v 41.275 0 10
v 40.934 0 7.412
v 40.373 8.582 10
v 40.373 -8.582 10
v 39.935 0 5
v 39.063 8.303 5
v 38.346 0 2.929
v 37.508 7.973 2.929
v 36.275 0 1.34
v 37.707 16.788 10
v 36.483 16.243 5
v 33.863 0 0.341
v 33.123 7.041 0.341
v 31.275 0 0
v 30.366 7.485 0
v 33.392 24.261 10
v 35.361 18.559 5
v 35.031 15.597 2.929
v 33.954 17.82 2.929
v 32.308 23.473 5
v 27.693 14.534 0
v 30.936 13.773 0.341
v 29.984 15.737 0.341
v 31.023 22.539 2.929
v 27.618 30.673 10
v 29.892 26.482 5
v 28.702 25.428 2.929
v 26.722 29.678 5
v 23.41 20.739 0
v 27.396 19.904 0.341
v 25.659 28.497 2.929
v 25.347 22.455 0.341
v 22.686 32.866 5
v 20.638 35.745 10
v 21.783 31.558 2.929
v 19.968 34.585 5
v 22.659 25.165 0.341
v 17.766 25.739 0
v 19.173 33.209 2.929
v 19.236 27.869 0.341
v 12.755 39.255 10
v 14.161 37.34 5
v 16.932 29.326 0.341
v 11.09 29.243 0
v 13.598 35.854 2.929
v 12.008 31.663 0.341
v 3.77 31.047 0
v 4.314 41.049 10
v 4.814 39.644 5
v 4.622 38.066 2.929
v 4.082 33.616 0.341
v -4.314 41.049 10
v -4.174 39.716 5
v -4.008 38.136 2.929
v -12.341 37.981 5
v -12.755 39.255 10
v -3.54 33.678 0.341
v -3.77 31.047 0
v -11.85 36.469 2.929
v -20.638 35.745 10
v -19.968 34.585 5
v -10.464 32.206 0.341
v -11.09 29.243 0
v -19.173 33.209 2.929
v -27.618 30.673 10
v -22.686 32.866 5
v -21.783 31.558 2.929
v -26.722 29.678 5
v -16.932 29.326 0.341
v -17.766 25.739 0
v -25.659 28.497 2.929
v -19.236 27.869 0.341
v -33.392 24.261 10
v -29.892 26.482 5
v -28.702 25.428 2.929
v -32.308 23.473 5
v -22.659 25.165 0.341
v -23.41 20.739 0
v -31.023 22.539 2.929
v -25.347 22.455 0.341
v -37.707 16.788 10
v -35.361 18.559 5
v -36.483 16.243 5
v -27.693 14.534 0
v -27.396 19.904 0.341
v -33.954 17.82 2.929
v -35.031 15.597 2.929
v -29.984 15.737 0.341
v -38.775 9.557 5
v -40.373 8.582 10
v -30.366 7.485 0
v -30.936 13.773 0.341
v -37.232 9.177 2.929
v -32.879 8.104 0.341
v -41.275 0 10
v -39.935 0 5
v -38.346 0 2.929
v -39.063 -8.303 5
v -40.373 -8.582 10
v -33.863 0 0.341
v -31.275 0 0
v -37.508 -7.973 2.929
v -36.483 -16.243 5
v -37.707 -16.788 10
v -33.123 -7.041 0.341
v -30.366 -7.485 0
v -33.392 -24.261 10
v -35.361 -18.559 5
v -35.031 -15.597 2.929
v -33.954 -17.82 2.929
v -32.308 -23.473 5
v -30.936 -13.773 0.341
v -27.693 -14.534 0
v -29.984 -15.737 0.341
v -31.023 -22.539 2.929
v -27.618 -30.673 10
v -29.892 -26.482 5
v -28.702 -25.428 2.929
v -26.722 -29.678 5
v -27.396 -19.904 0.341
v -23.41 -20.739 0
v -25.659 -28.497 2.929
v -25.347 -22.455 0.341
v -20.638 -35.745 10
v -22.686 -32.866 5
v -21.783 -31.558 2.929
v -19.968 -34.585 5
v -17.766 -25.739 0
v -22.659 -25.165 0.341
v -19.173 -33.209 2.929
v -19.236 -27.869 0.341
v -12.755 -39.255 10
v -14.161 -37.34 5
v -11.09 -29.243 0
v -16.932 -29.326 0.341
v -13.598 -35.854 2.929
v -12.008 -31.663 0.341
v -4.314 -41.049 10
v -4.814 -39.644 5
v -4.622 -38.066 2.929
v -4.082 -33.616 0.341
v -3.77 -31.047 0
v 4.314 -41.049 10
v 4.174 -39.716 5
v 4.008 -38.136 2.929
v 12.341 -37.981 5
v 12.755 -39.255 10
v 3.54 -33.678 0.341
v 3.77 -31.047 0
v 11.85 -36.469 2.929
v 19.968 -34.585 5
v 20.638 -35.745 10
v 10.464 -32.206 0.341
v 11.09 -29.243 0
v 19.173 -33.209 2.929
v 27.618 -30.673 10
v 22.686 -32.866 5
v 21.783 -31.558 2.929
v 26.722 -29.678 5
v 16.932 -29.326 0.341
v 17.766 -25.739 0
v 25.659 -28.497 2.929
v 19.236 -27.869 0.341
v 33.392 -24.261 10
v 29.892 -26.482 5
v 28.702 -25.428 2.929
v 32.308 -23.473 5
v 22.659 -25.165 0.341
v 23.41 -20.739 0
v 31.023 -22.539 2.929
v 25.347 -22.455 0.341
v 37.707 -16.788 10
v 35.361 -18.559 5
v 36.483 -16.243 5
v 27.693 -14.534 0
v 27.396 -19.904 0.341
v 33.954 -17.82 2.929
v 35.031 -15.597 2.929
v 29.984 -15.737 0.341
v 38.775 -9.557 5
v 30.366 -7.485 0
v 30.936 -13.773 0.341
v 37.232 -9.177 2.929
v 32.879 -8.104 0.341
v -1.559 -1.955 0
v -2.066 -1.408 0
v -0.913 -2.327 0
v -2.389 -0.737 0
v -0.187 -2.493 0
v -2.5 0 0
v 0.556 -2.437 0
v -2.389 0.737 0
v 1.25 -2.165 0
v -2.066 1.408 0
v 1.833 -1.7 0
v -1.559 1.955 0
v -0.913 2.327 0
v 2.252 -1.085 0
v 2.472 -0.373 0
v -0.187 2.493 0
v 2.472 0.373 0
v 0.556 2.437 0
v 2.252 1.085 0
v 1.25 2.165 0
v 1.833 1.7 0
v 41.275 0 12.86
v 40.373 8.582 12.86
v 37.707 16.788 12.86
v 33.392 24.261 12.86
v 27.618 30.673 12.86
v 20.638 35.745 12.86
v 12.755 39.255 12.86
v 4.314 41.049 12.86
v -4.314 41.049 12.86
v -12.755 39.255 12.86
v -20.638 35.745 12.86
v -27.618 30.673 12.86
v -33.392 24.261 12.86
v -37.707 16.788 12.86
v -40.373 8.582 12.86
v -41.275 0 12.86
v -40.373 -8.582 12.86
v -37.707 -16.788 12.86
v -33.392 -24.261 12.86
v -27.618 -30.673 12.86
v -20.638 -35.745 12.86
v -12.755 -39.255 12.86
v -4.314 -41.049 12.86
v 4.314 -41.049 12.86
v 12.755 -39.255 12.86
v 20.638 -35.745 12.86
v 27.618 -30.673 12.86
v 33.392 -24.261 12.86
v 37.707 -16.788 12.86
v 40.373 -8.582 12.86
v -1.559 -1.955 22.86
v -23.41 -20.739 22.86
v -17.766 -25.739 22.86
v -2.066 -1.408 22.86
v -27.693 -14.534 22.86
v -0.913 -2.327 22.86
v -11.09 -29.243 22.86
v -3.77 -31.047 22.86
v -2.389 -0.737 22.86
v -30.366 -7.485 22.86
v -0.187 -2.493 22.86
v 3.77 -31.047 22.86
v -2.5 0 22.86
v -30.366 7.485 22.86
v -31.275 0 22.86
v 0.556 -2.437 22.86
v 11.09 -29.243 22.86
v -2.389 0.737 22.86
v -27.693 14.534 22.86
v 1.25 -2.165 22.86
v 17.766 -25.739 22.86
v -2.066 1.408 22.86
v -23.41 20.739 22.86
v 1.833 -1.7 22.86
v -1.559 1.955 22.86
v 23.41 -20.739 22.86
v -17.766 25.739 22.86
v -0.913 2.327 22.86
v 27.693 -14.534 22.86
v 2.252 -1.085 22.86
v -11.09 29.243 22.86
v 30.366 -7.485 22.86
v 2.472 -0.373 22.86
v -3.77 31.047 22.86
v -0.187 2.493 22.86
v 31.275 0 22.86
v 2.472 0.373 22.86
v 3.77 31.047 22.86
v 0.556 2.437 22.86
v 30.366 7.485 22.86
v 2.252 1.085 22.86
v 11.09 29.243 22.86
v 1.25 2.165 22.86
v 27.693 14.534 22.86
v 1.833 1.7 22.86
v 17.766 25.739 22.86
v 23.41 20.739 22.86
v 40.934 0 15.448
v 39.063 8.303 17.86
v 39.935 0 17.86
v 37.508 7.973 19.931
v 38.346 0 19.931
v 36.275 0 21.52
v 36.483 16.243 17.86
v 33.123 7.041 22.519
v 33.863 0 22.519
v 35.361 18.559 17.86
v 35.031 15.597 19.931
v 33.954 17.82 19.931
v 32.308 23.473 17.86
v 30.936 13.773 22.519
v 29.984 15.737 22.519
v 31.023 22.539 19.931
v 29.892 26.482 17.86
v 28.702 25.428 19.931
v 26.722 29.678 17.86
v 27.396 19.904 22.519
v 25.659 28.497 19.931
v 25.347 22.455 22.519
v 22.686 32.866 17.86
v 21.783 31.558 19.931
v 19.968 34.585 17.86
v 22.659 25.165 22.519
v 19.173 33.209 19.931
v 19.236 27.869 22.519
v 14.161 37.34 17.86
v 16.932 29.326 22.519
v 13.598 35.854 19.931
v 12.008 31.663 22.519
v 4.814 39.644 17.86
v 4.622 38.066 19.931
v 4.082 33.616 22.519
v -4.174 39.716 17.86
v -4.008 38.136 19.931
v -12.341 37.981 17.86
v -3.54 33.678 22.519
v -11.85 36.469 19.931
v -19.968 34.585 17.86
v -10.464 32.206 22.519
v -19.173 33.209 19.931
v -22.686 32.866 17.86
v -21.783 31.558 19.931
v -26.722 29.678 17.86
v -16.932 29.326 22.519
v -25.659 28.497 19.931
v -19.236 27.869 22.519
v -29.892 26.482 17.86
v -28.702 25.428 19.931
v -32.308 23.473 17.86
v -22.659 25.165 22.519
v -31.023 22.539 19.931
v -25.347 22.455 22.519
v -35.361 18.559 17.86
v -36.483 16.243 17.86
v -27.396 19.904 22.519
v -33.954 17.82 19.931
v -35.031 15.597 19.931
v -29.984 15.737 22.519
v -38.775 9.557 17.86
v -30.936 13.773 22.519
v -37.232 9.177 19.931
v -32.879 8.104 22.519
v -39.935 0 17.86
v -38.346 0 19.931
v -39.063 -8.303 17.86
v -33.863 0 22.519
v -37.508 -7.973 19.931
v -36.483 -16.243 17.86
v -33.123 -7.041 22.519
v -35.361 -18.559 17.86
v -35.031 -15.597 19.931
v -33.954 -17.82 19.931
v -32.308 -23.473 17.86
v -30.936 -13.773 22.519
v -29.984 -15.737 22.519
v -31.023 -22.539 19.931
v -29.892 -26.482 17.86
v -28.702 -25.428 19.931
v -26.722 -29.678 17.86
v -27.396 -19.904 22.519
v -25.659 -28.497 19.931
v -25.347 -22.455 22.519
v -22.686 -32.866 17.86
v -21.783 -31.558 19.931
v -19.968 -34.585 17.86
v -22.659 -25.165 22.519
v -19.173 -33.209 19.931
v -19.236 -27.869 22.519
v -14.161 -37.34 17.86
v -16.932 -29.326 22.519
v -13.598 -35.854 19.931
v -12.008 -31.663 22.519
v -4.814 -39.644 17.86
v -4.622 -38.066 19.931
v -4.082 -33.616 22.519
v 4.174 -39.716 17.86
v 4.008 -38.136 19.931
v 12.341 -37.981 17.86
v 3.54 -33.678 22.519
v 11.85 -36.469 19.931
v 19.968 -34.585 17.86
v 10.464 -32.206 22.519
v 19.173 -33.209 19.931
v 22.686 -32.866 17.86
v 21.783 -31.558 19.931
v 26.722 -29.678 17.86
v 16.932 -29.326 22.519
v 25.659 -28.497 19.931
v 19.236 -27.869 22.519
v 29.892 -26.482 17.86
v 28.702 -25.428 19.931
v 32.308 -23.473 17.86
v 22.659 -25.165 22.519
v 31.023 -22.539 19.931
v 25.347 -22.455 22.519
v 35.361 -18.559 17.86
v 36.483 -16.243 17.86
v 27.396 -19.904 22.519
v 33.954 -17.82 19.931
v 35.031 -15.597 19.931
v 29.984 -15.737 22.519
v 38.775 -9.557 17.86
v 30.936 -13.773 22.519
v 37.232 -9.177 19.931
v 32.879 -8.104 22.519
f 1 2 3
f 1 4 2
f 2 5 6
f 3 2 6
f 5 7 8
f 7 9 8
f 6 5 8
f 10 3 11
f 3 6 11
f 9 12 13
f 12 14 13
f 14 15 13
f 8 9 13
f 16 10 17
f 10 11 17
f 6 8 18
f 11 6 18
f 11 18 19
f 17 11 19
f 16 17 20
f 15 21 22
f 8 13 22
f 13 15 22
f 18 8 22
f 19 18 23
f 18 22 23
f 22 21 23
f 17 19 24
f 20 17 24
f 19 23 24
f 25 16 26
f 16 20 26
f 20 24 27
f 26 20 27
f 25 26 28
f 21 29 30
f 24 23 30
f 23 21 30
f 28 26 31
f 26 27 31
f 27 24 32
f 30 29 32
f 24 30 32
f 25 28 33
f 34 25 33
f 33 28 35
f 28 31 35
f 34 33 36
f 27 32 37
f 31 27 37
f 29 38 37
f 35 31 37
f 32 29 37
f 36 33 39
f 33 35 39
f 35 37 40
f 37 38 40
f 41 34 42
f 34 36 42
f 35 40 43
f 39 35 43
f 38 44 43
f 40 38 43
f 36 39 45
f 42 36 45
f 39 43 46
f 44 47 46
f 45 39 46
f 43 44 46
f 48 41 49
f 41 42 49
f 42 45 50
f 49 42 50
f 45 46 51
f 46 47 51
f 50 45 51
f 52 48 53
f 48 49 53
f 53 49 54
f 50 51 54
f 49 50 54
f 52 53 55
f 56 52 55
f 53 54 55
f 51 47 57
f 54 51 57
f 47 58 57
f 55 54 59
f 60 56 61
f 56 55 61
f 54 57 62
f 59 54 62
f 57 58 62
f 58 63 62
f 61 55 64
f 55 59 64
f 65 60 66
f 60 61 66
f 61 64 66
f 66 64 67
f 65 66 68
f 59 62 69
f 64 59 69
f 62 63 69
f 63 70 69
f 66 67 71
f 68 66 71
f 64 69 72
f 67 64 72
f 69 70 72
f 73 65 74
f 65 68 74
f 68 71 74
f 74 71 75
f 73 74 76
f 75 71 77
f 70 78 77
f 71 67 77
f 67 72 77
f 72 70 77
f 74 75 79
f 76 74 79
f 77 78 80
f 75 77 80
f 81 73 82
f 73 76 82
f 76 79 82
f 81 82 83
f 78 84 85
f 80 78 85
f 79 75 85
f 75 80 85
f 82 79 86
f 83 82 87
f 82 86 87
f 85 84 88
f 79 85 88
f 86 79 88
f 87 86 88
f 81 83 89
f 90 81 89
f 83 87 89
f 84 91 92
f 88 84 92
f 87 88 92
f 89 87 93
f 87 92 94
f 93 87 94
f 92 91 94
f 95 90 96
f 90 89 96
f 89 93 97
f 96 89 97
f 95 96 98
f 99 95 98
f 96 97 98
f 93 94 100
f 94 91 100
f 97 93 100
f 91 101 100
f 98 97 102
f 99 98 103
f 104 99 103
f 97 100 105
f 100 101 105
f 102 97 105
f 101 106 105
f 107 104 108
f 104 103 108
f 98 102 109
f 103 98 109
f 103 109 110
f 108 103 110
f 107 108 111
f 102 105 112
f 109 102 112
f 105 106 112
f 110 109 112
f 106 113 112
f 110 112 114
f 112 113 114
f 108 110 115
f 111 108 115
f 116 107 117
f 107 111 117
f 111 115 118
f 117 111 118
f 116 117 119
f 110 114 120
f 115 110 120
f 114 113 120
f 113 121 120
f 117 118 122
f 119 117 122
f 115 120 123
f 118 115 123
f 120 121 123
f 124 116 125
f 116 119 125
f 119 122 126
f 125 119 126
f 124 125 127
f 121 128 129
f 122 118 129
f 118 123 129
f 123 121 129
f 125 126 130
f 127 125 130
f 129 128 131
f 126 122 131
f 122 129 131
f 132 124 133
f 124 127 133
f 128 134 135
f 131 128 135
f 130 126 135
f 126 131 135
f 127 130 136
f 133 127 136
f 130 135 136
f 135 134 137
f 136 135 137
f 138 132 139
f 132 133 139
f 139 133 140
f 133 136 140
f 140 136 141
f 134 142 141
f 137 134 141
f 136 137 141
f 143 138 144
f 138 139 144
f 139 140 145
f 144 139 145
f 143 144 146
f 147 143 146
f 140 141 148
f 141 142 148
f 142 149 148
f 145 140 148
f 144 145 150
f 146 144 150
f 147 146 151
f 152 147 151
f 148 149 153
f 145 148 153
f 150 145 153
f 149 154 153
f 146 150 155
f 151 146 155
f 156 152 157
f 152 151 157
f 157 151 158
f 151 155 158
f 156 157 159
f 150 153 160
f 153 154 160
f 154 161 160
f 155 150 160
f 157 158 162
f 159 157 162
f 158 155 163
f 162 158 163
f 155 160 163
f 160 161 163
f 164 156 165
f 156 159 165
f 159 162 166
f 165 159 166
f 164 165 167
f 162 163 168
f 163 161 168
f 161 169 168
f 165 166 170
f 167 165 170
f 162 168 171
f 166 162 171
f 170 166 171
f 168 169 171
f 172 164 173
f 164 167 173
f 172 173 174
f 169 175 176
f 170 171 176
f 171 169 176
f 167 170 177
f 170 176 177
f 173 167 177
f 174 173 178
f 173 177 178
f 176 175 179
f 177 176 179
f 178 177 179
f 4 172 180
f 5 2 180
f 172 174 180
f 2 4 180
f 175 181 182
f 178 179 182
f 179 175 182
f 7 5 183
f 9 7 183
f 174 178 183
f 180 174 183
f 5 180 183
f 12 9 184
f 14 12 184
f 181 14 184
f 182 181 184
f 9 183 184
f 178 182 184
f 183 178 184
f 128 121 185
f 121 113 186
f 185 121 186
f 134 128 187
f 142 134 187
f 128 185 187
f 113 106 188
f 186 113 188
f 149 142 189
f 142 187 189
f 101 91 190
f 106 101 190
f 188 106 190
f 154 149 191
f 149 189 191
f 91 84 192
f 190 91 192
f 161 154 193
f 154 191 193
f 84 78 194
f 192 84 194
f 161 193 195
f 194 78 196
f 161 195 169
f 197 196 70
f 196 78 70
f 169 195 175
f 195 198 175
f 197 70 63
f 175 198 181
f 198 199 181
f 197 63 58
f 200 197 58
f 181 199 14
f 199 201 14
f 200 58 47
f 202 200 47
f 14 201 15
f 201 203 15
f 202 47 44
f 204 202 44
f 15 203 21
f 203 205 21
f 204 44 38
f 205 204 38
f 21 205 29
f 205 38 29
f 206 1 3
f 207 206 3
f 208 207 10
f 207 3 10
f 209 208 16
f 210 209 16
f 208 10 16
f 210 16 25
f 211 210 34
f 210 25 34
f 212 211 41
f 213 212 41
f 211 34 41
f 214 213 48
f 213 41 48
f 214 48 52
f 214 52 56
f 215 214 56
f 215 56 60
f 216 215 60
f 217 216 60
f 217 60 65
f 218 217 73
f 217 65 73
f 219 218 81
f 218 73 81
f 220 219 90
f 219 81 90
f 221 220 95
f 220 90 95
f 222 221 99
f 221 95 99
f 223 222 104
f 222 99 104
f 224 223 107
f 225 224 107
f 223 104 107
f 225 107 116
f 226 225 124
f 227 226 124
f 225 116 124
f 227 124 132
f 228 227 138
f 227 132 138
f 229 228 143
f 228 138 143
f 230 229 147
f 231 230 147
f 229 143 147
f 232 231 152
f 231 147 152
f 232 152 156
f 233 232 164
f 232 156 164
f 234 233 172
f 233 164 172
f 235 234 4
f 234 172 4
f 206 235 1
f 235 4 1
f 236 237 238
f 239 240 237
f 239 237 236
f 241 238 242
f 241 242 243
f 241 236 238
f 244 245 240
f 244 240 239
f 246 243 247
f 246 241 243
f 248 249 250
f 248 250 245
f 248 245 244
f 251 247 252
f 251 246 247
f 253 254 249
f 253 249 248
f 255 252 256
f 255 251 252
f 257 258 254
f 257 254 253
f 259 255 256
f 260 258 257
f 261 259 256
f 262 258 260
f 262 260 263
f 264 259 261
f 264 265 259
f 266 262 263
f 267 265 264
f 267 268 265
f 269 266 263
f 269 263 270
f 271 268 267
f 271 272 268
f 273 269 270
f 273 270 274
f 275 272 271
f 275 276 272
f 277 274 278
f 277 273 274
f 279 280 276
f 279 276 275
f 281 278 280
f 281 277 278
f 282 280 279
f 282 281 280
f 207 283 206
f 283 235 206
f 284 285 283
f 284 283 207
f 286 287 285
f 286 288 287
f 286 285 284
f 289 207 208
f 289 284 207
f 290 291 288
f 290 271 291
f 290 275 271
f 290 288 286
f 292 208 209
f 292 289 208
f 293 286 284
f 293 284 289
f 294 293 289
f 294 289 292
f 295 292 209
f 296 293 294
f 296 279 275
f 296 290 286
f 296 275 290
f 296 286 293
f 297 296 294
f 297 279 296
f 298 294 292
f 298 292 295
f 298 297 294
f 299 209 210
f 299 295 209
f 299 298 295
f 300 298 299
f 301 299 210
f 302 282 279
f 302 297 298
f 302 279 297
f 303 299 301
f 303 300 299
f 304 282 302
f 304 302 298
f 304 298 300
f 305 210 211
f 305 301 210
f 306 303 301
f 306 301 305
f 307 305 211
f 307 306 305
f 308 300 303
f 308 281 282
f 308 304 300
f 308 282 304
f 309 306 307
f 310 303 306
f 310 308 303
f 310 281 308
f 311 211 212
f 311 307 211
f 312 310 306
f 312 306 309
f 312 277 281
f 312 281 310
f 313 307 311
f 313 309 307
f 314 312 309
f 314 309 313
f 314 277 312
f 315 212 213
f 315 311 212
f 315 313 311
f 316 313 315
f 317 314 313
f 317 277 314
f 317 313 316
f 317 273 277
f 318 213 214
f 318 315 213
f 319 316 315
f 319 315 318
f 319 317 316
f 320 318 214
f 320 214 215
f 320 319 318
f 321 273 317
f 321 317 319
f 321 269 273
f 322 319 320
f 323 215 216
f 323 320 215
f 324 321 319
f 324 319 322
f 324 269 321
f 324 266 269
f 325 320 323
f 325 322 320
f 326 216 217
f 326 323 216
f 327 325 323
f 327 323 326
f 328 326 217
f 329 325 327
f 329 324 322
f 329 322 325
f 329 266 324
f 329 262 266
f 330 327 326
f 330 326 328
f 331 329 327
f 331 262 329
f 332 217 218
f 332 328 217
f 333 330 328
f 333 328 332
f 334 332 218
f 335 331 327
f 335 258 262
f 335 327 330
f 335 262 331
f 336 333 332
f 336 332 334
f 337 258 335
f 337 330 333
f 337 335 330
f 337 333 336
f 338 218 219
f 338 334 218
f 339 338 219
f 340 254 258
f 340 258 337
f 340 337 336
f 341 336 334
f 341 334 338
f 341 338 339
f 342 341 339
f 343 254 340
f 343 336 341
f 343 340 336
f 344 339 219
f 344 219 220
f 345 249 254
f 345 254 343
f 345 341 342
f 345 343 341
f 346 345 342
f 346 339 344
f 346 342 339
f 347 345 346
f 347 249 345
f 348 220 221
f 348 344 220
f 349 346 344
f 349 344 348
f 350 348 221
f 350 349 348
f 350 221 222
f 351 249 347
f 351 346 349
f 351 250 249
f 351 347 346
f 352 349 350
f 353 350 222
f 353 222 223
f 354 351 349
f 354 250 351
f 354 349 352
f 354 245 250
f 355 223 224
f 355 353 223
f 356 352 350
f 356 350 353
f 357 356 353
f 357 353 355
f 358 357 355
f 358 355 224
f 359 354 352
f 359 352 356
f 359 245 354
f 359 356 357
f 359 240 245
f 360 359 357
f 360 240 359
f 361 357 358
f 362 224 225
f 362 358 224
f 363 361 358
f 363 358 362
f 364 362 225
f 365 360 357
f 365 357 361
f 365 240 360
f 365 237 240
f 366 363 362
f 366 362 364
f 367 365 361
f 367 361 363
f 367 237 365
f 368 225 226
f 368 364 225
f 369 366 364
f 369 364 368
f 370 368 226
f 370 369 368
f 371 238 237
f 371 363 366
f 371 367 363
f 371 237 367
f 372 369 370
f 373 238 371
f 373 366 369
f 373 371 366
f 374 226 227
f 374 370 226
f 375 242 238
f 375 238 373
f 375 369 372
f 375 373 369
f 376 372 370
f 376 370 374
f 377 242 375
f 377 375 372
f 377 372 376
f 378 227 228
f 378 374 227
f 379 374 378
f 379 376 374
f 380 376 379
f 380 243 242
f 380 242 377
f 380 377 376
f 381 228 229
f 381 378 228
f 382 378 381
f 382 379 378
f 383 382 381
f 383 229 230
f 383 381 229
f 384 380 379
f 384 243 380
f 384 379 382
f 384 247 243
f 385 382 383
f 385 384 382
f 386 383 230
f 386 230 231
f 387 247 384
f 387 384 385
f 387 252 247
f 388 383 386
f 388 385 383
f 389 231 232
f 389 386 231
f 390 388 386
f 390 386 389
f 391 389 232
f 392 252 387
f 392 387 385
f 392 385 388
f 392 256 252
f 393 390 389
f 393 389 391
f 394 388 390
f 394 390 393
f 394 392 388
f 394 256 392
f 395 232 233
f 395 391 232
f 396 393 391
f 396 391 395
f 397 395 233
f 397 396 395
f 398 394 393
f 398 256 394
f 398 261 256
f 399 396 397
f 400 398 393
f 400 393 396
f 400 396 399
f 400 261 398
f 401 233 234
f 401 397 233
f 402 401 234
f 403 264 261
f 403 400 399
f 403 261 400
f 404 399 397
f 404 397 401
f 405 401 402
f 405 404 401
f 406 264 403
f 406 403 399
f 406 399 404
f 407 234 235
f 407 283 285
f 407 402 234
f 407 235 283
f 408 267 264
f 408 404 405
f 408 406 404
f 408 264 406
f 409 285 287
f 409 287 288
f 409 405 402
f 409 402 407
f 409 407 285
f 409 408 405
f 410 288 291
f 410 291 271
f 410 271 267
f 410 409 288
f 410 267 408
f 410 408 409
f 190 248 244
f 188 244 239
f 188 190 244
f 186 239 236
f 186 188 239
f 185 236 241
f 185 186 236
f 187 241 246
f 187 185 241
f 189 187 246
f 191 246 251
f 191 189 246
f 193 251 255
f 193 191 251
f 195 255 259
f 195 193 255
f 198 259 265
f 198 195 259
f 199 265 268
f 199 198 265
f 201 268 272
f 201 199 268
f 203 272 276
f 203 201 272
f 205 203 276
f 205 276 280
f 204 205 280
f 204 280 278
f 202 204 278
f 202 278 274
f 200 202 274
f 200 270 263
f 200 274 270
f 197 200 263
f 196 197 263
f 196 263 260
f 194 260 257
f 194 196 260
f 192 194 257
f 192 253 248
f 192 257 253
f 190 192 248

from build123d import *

# Parameters (mm, degrees)
SKETCH1_R           = 41.275
BOSS_EXTRUDE1_DEPTH = 22.86
CUT_EXTRUDE1_REACH  = 64.688
SKETCH2_R           = 2.5
FILLET2_R           = 10


with BuildPart() as part:
    # Sketch1 → Boss-Extrude1 (new body)
    with BuildSketch(Plane.XY):
        Circle(SKETCH1_R)
    extrude(amount=BOSS_EXTRUDE1_DEPTH)

    # Sketch2 → Cut-Extrude1 (cut, up to next)
    with BuildSketch(Plane.XY, mode=Mode.PRIVATE) as cut_extrude1_sk1:
        with Locations(Location((0, 0, 0), (0, 0, 180))):
            Circle(SKETCH2_R)
    cut_extrude1_tool1 = extrude(cut_extrude1_sk1.sketch, amount=CUT_EXTRUDE1_REACH, mode=Mode.PRIVATE) & part.part
    add(cut_extrude1_tool1.solids().sort_by_distance((0, 0, 0))[0], mode=Mode.SUBTRACT)

    # Fillet2
    fillet2_edges = [part.edges().sort_by_distance(p)[0] for p in [
        (-41.275, 0, 0),
        (-41.275, 0, 22.86),
    ]]
    fillet(fillet2_edges, radius=FILLET2_R)


solid = part.part
